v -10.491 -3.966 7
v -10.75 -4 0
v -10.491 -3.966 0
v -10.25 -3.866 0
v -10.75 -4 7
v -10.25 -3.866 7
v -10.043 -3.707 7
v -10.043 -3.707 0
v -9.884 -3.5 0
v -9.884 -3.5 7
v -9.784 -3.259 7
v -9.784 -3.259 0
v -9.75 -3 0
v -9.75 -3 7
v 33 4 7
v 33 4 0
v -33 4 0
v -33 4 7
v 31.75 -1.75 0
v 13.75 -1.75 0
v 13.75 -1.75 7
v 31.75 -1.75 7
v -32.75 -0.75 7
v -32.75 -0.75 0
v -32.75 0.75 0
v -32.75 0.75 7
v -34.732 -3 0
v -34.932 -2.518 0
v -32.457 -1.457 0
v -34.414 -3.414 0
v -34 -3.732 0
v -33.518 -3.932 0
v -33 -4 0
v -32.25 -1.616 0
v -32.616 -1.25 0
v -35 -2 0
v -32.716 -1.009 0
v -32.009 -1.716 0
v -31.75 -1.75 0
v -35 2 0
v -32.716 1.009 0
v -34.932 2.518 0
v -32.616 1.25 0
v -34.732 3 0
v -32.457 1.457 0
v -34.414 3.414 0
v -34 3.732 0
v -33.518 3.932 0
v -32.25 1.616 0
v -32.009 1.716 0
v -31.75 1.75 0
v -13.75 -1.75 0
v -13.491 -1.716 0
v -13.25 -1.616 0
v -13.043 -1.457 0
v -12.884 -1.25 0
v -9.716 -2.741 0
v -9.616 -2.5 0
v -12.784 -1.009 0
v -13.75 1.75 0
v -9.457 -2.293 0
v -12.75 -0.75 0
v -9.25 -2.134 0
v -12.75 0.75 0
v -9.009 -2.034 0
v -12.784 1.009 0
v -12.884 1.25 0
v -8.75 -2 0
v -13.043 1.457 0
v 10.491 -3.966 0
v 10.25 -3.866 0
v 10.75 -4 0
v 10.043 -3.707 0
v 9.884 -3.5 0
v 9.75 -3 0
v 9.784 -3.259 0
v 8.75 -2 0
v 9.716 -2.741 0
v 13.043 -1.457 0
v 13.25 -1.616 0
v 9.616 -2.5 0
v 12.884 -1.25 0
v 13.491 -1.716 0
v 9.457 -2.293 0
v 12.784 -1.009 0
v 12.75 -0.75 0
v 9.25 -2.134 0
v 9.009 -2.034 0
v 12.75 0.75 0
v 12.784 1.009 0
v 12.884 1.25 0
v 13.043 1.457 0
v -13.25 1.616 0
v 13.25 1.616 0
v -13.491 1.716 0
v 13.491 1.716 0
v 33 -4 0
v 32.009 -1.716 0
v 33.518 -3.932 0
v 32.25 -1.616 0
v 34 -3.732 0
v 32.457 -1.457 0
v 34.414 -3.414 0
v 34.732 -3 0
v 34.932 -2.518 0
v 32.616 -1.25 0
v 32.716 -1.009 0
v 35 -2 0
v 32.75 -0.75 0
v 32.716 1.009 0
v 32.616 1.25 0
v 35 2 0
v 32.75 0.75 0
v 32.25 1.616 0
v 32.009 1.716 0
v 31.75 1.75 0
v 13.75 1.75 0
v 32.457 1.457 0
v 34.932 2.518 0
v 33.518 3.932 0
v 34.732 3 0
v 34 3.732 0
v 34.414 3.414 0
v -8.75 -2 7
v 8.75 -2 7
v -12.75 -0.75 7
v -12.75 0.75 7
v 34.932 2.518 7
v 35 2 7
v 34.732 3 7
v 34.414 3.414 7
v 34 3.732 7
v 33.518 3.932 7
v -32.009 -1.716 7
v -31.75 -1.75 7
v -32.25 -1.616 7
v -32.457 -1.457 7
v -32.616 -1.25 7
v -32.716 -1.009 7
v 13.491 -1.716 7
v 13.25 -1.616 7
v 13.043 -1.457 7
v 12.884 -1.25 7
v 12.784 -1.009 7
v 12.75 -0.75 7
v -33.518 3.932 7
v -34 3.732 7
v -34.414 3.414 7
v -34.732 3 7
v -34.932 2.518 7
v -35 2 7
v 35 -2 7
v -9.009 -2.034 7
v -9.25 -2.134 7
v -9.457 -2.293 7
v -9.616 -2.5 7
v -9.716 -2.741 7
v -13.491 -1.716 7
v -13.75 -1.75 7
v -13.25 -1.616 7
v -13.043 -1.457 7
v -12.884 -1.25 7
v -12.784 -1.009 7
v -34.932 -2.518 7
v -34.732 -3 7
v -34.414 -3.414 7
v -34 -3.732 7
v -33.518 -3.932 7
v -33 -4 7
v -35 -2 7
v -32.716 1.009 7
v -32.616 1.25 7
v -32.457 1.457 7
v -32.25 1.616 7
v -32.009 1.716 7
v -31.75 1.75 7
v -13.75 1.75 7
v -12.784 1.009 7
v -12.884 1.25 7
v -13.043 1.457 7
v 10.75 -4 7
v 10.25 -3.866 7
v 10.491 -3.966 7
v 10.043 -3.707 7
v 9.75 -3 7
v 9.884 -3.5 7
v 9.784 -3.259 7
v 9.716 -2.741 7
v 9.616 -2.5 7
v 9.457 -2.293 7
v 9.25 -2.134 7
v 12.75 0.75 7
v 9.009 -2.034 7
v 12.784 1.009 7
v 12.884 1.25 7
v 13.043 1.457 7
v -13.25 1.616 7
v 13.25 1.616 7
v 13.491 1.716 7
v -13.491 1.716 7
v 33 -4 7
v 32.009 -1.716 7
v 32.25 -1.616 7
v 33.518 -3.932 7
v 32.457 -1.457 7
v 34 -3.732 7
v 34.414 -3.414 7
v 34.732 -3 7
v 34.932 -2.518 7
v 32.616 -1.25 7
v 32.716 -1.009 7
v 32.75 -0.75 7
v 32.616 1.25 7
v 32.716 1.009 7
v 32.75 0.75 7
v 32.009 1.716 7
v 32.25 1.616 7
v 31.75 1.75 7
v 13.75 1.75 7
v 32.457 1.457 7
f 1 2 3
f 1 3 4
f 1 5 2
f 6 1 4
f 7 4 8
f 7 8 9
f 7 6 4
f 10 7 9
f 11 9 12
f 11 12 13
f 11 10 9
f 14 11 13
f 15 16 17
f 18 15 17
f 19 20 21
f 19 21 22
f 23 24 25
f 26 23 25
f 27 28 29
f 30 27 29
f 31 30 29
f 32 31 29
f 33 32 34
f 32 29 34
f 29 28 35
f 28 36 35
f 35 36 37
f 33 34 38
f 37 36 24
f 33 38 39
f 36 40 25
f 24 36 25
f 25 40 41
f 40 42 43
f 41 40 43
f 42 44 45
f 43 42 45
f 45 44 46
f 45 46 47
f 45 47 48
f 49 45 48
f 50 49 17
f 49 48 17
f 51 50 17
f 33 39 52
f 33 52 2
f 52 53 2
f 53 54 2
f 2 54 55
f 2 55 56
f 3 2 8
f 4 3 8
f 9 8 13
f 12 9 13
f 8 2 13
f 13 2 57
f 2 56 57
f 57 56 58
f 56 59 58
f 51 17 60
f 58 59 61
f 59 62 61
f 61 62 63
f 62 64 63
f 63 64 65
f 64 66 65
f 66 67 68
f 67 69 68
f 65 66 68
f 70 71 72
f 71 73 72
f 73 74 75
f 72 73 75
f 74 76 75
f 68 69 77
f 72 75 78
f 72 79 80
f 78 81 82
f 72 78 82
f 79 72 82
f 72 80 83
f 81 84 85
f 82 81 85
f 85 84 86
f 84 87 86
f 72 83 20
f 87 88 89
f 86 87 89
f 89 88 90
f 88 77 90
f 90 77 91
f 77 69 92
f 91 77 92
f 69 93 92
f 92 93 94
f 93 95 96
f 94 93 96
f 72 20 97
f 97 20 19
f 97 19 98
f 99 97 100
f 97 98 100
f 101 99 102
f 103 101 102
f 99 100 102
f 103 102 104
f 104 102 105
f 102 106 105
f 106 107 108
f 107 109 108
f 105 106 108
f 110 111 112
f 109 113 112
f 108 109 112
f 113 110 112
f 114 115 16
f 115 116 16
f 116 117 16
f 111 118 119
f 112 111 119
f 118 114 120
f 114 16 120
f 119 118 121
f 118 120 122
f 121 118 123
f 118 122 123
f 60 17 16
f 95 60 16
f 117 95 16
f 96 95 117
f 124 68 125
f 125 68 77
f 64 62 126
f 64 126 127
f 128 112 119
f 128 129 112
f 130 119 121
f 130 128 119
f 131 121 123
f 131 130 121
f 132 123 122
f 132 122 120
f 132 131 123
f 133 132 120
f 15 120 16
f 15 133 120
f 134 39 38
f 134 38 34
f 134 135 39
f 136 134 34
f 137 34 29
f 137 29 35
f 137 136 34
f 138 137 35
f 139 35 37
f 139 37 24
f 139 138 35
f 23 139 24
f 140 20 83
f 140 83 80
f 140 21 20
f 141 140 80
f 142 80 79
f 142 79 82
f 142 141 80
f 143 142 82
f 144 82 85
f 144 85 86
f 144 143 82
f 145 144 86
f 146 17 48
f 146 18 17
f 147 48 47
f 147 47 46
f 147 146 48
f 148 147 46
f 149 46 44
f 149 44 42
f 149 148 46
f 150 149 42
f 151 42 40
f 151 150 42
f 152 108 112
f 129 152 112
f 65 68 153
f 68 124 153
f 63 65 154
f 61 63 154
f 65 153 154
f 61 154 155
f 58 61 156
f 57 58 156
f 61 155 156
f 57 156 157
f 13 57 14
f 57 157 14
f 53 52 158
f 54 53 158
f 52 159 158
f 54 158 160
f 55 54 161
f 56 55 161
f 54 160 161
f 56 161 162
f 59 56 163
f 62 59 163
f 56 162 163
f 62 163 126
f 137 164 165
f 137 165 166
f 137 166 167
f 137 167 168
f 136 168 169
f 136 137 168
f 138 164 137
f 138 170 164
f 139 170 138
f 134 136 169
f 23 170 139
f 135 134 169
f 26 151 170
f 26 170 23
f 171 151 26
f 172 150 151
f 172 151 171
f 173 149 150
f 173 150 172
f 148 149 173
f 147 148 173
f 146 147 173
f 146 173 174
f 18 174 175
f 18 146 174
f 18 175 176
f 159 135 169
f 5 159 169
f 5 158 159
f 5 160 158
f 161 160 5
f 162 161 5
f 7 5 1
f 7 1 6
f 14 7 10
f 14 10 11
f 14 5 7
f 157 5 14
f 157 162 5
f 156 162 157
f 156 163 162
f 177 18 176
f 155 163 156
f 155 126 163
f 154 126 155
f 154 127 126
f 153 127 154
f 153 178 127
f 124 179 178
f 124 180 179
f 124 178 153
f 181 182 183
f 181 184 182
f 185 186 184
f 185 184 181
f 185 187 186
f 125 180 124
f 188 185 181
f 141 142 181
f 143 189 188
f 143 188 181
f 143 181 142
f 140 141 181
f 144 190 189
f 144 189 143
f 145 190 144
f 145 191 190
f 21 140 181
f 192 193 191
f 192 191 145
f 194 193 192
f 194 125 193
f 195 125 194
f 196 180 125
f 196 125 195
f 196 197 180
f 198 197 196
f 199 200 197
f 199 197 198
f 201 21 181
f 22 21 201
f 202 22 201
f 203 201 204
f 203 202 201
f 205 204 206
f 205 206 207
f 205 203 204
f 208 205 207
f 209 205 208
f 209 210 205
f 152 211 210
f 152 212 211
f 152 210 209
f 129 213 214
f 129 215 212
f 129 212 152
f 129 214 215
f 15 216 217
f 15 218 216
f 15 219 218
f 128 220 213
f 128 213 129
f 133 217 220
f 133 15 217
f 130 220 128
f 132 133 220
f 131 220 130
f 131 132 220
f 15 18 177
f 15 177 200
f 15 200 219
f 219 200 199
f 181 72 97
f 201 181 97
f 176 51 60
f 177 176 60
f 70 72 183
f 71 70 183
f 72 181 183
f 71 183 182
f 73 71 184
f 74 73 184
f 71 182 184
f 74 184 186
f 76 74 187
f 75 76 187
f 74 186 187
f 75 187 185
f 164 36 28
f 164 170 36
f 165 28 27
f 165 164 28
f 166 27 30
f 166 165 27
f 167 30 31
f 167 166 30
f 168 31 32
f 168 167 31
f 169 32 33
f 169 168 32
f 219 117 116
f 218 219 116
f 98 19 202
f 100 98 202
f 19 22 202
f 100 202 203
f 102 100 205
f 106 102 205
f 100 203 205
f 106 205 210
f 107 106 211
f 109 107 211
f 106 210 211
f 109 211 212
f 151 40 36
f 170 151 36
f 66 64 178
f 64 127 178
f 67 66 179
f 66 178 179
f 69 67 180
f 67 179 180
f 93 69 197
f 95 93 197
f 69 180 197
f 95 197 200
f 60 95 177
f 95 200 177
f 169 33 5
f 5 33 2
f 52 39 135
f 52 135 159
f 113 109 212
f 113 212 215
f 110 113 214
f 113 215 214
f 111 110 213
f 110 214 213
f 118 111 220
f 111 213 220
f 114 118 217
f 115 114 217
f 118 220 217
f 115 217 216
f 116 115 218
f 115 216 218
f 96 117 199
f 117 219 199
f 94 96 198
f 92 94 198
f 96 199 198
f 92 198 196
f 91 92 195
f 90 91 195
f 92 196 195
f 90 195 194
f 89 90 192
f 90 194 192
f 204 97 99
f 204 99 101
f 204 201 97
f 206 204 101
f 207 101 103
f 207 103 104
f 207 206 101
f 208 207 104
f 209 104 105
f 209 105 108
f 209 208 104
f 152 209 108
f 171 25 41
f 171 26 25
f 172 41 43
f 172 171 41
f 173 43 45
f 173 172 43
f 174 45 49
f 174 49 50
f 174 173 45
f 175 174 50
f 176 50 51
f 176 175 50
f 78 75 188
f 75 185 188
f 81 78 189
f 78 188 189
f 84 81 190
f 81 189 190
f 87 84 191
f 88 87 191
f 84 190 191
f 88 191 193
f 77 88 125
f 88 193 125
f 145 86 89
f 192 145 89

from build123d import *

# Parameters (mm, degrees)
F0_W     = 20
F0_H     = 3.5
F1_DEPTH = 7
F2_R     = 0.99999
F3_R     = 2


# Not quite as in the source:
# - two fillets or chamfers of one size are made in one step
# - a fillet or chamfer is up to 0.001 mm smaller than in the source, because OpenCascade refuses the exact size


with BuildPart() as f1:
    # F0 (on Top) → F1 (new body)
    with BuildSketch(Plane.XY):
        Polygon((35, -4), (35, 4), (-35, 4), (-35, -4), (-9.7500002012, -4), (-9.7500002012, -2), (9.75, -2), (9.75, -4), align=None)
        with Locations((-22.75, 0)):
            Rectangle(F0_W, F0_H, mode=Mode.SUBTRACT)
        with Locations((22.75, 0)):
            Rectangle(F0_W, F0_H, mode=Mode.SUBTRACT)
    extrude(amount=F1_DEPTH)

    # F2 (radius 1 in the source; OpenCascade refuses exactly that, so slightly less here)
    f2_edges = [f1.edges().sort_by_distance(p)[0] for p in [
        (32.75, 1.75, 3.5),
        (12.75, 1.75, 3.5),
        (12.75, -1.75, 3.5),
        (32.75, -1.75, 3.5),
        (-12.75, -1.75, 3.5),
        (-12.75, 1.75, 3.5),
        (-32.75, 1.75, 3.5),
        (-32.75, -1.75, 3.5),
        (-9.75, -4, 3.5),
        (-9.75, -2, 3.5),
        (9.75, -2, 3.5),
        (9.75, -4, 3.5),
    ]]
    fillet(f2_edges, radius=F2_R)

    # F3
    f3_edges = [f1.edges().sort_by_distance(p)[0] for p in [
        (35, -4, 3.5),
        (35, 4, 3.5),
        (-35, -4, 3.5),
        (-35, 4, 3.5),
    ]]
    fillet(f3_edges, radius=F3_R)


solid = f1.part
